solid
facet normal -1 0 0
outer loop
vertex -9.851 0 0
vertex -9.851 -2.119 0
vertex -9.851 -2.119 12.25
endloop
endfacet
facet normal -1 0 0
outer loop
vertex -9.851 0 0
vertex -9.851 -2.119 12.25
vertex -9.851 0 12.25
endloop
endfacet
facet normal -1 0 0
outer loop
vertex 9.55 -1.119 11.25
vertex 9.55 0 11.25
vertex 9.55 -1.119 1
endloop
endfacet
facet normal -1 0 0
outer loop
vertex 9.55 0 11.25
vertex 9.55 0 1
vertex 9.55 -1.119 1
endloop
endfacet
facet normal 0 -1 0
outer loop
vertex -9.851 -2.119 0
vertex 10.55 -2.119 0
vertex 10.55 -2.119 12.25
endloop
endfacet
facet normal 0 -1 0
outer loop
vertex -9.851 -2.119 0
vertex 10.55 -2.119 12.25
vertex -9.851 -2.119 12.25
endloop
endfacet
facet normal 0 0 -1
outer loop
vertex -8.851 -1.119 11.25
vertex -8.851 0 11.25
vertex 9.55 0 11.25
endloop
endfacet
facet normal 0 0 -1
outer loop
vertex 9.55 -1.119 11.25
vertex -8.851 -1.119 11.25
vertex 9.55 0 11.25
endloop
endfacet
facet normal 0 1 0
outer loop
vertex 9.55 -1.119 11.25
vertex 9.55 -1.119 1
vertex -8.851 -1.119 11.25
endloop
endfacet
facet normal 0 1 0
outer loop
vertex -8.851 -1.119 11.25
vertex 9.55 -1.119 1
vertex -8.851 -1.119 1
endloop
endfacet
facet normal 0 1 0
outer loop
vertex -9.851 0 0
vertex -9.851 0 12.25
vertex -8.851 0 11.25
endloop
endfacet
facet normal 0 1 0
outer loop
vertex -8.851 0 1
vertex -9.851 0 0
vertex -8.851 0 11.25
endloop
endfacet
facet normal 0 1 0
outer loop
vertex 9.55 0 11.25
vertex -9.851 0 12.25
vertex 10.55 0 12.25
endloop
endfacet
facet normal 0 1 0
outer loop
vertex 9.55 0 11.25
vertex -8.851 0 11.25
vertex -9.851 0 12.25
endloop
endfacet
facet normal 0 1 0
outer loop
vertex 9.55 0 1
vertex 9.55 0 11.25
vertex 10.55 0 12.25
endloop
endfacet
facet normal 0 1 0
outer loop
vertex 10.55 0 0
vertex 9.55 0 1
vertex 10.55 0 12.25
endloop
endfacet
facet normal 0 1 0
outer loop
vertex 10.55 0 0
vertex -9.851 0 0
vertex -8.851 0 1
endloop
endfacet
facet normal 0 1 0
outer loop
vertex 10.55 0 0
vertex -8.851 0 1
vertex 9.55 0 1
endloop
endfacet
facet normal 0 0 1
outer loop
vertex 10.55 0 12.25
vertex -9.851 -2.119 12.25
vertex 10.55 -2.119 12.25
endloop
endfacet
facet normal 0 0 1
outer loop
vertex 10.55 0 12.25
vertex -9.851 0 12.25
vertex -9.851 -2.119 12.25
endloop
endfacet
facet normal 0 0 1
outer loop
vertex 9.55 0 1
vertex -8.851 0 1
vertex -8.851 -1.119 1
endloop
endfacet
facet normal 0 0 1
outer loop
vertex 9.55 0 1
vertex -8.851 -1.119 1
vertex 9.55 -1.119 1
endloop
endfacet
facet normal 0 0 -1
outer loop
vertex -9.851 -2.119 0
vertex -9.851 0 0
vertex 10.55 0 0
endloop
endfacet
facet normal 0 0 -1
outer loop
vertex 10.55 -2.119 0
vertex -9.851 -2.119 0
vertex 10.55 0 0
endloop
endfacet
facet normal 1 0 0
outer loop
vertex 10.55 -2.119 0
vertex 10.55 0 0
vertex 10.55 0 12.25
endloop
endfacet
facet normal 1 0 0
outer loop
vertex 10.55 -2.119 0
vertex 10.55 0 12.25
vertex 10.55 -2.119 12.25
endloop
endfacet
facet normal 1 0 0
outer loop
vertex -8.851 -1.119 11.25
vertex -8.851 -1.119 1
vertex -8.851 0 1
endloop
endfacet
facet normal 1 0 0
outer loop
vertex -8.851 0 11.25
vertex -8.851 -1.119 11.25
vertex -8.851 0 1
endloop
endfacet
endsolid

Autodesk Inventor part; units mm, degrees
ref_plane "YZ Plane" through (0, 0, 0) normal (1, 0, 0) x (0, 1, 0)
ref_plane "XZ Plane" through (0, 0, 0) normal (0, 1, 0) x (-1, 0, 0)
ref_plane "XY Plane" through (0, 0, 0) normal (0, 0, 1) x (1, 0, 0)
sketch "Sketch1" plane through (0, 0, 0) normal (0, 0, 1) x (1, 0, 0)
  line L0 (-9.8509, 0) -> (10.5499, 0)
  line L1 (10.5499, 0) -> (10.5499, -2.1187)
  line L2 (10.5499, -2.1187) -> (-9.8509, -2.1187)
  line L3 (-9.8509, -2.1187) -> (-9.8509, 0)
  point P0 (0, 0)
extrude "Extrusion1" add sketch "Sketch1" along normal blind 12.25
sketch "Sketch2" plane through (-9.8509, 0, 0) normal (0, 1, 0) x (1, 0, 0)
  line L0 (20.4008, 0) -> (0, 0) projected
  line L1 (0, 0) -> (0, -12.25) projected
  line L2 (20.4008, -12.25) -> (0, -12.25) projected
  line L3 (20.4008, 0) -> (20.4008, -12.25) projected
  line L4 (1.2669, -10.9831) -> (1.2669, -1.2669)
  line L5 (1.2669, -1.2669) -> (19.1339, -1.2669)
  line L6 (19.1339, -1.2669) -> (19.1339, -10.9831)
  line L7 (19.1339, -10.9831) -> (1.2669, -10.9831)
  point P0 (9.8509, 0)
  point P1 (9.3922, -1.2669)
  point P2 (9.3922, -10.9831)
shell "Shell1" thickness 1 removed faces 1 at (3.7496, 0, 4.0833)
properties part number "pan"
